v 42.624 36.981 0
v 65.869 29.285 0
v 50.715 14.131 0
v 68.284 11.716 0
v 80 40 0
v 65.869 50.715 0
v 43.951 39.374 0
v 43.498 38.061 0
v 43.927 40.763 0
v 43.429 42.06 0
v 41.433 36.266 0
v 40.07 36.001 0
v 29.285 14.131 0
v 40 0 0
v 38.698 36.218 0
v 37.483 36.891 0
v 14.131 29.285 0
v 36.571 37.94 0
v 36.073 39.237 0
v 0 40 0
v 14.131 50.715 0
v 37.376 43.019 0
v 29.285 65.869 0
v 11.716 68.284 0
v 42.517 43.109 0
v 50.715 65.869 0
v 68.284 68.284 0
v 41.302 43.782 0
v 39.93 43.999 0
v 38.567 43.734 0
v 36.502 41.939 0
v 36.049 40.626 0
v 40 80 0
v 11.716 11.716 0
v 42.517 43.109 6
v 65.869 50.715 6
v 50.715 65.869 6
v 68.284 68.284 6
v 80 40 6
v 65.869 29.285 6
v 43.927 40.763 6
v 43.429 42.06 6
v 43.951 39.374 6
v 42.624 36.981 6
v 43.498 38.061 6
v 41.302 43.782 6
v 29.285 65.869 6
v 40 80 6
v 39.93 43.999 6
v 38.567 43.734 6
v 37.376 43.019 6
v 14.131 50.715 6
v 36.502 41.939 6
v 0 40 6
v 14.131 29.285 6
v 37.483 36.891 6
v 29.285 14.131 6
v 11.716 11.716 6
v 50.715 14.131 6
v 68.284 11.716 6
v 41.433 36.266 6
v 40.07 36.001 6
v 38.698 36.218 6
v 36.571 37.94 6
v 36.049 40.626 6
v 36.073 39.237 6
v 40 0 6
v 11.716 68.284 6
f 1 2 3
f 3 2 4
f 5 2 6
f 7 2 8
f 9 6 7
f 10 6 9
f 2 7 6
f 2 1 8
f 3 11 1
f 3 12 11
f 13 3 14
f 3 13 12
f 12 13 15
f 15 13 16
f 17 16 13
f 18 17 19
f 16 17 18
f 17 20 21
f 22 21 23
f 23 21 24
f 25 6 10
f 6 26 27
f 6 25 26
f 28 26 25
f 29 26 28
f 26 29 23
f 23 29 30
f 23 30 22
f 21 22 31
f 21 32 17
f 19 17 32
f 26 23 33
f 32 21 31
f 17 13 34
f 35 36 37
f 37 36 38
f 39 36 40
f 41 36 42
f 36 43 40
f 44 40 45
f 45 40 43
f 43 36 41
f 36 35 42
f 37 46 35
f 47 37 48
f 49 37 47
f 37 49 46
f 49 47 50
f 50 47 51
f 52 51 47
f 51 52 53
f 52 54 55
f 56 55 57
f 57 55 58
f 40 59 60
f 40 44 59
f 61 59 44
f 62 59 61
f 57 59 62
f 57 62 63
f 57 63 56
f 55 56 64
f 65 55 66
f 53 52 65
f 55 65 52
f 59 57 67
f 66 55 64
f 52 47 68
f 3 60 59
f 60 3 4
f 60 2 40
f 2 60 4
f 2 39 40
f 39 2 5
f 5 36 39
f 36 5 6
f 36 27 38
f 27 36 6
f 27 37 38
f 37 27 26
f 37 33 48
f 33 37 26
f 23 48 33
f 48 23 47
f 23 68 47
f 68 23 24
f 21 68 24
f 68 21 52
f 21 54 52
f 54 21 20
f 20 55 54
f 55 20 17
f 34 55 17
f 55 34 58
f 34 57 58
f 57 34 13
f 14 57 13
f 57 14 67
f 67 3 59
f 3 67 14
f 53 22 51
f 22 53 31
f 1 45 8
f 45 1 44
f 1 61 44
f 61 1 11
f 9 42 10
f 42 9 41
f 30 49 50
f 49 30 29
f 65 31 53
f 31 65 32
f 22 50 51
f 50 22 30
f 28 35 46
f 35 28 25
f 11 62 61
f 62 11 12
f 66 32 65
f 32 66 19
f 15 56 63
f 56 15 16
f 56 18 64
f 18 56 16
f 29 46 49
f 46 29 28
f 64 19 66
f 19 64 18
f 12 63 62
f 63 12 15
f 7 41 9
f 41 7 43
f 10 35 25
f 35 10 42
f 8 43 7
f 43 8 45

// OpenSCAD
$fn = 32;

// ----------------------------------------------------------------------
// Star wheel: 8-point blunt, R40
// ----------------------------------------------------------------------

// --- parameters (mm) ---
n_points = 8;             // number of points / teeth
r_out = 40;               // tip radius
r_in = 28;                // root radius
bore_r = 4;               // centre bore radius
plate_t = 6;              // plate thickness, Z (extrusion height)
bore_d = 8;               // centre bore diameter
fit_tol = 0.1;            // declared fit tolerance (prompt contract)
free_tol = 0.5;           // declared free tolerance (prompt contract)

profile = [[80, 40], [65.869, 50.715], [68.284, 68.284], [50.715, 65.869], [40, 80], [29.285, 65.869], [11.716, 68.284], [14.131, 50.715], [0, 40], [14.131, 29.285], [11.716, 11.716], [29.285, 14.131], [40, 0], [50.715, 14.131], [68.284, 11.716], [65.869, 29.285]];  // primary outline, 16 points, counter clockwise
void_1 = [[43.927, 40.763], [43.429, 42.06], [42.517, 43.109], [41.302, 43.782], [39.93, 43.999], [38.567, 43.734], [37.376, 43.019], [36.502, 41.939], [36.049, 40.626], [36.073, 39.237], [36.571, 37.94], [37.483, 36.891], [38.698, 36.218], [40.07, 36.001], [41.433, 36.266], [42.624, 36.981], [43.498, 38.061], [43.951, 39.374]];  // centre bore, 18 points

// --- the one profile operation ---
difference() {
  linear_extrude(height = plate_t) polygon(points = profile);
  translate([0, 0, -1])
    linear_extrude(height = plate_t + 2) polygon(points = void_1);
}
